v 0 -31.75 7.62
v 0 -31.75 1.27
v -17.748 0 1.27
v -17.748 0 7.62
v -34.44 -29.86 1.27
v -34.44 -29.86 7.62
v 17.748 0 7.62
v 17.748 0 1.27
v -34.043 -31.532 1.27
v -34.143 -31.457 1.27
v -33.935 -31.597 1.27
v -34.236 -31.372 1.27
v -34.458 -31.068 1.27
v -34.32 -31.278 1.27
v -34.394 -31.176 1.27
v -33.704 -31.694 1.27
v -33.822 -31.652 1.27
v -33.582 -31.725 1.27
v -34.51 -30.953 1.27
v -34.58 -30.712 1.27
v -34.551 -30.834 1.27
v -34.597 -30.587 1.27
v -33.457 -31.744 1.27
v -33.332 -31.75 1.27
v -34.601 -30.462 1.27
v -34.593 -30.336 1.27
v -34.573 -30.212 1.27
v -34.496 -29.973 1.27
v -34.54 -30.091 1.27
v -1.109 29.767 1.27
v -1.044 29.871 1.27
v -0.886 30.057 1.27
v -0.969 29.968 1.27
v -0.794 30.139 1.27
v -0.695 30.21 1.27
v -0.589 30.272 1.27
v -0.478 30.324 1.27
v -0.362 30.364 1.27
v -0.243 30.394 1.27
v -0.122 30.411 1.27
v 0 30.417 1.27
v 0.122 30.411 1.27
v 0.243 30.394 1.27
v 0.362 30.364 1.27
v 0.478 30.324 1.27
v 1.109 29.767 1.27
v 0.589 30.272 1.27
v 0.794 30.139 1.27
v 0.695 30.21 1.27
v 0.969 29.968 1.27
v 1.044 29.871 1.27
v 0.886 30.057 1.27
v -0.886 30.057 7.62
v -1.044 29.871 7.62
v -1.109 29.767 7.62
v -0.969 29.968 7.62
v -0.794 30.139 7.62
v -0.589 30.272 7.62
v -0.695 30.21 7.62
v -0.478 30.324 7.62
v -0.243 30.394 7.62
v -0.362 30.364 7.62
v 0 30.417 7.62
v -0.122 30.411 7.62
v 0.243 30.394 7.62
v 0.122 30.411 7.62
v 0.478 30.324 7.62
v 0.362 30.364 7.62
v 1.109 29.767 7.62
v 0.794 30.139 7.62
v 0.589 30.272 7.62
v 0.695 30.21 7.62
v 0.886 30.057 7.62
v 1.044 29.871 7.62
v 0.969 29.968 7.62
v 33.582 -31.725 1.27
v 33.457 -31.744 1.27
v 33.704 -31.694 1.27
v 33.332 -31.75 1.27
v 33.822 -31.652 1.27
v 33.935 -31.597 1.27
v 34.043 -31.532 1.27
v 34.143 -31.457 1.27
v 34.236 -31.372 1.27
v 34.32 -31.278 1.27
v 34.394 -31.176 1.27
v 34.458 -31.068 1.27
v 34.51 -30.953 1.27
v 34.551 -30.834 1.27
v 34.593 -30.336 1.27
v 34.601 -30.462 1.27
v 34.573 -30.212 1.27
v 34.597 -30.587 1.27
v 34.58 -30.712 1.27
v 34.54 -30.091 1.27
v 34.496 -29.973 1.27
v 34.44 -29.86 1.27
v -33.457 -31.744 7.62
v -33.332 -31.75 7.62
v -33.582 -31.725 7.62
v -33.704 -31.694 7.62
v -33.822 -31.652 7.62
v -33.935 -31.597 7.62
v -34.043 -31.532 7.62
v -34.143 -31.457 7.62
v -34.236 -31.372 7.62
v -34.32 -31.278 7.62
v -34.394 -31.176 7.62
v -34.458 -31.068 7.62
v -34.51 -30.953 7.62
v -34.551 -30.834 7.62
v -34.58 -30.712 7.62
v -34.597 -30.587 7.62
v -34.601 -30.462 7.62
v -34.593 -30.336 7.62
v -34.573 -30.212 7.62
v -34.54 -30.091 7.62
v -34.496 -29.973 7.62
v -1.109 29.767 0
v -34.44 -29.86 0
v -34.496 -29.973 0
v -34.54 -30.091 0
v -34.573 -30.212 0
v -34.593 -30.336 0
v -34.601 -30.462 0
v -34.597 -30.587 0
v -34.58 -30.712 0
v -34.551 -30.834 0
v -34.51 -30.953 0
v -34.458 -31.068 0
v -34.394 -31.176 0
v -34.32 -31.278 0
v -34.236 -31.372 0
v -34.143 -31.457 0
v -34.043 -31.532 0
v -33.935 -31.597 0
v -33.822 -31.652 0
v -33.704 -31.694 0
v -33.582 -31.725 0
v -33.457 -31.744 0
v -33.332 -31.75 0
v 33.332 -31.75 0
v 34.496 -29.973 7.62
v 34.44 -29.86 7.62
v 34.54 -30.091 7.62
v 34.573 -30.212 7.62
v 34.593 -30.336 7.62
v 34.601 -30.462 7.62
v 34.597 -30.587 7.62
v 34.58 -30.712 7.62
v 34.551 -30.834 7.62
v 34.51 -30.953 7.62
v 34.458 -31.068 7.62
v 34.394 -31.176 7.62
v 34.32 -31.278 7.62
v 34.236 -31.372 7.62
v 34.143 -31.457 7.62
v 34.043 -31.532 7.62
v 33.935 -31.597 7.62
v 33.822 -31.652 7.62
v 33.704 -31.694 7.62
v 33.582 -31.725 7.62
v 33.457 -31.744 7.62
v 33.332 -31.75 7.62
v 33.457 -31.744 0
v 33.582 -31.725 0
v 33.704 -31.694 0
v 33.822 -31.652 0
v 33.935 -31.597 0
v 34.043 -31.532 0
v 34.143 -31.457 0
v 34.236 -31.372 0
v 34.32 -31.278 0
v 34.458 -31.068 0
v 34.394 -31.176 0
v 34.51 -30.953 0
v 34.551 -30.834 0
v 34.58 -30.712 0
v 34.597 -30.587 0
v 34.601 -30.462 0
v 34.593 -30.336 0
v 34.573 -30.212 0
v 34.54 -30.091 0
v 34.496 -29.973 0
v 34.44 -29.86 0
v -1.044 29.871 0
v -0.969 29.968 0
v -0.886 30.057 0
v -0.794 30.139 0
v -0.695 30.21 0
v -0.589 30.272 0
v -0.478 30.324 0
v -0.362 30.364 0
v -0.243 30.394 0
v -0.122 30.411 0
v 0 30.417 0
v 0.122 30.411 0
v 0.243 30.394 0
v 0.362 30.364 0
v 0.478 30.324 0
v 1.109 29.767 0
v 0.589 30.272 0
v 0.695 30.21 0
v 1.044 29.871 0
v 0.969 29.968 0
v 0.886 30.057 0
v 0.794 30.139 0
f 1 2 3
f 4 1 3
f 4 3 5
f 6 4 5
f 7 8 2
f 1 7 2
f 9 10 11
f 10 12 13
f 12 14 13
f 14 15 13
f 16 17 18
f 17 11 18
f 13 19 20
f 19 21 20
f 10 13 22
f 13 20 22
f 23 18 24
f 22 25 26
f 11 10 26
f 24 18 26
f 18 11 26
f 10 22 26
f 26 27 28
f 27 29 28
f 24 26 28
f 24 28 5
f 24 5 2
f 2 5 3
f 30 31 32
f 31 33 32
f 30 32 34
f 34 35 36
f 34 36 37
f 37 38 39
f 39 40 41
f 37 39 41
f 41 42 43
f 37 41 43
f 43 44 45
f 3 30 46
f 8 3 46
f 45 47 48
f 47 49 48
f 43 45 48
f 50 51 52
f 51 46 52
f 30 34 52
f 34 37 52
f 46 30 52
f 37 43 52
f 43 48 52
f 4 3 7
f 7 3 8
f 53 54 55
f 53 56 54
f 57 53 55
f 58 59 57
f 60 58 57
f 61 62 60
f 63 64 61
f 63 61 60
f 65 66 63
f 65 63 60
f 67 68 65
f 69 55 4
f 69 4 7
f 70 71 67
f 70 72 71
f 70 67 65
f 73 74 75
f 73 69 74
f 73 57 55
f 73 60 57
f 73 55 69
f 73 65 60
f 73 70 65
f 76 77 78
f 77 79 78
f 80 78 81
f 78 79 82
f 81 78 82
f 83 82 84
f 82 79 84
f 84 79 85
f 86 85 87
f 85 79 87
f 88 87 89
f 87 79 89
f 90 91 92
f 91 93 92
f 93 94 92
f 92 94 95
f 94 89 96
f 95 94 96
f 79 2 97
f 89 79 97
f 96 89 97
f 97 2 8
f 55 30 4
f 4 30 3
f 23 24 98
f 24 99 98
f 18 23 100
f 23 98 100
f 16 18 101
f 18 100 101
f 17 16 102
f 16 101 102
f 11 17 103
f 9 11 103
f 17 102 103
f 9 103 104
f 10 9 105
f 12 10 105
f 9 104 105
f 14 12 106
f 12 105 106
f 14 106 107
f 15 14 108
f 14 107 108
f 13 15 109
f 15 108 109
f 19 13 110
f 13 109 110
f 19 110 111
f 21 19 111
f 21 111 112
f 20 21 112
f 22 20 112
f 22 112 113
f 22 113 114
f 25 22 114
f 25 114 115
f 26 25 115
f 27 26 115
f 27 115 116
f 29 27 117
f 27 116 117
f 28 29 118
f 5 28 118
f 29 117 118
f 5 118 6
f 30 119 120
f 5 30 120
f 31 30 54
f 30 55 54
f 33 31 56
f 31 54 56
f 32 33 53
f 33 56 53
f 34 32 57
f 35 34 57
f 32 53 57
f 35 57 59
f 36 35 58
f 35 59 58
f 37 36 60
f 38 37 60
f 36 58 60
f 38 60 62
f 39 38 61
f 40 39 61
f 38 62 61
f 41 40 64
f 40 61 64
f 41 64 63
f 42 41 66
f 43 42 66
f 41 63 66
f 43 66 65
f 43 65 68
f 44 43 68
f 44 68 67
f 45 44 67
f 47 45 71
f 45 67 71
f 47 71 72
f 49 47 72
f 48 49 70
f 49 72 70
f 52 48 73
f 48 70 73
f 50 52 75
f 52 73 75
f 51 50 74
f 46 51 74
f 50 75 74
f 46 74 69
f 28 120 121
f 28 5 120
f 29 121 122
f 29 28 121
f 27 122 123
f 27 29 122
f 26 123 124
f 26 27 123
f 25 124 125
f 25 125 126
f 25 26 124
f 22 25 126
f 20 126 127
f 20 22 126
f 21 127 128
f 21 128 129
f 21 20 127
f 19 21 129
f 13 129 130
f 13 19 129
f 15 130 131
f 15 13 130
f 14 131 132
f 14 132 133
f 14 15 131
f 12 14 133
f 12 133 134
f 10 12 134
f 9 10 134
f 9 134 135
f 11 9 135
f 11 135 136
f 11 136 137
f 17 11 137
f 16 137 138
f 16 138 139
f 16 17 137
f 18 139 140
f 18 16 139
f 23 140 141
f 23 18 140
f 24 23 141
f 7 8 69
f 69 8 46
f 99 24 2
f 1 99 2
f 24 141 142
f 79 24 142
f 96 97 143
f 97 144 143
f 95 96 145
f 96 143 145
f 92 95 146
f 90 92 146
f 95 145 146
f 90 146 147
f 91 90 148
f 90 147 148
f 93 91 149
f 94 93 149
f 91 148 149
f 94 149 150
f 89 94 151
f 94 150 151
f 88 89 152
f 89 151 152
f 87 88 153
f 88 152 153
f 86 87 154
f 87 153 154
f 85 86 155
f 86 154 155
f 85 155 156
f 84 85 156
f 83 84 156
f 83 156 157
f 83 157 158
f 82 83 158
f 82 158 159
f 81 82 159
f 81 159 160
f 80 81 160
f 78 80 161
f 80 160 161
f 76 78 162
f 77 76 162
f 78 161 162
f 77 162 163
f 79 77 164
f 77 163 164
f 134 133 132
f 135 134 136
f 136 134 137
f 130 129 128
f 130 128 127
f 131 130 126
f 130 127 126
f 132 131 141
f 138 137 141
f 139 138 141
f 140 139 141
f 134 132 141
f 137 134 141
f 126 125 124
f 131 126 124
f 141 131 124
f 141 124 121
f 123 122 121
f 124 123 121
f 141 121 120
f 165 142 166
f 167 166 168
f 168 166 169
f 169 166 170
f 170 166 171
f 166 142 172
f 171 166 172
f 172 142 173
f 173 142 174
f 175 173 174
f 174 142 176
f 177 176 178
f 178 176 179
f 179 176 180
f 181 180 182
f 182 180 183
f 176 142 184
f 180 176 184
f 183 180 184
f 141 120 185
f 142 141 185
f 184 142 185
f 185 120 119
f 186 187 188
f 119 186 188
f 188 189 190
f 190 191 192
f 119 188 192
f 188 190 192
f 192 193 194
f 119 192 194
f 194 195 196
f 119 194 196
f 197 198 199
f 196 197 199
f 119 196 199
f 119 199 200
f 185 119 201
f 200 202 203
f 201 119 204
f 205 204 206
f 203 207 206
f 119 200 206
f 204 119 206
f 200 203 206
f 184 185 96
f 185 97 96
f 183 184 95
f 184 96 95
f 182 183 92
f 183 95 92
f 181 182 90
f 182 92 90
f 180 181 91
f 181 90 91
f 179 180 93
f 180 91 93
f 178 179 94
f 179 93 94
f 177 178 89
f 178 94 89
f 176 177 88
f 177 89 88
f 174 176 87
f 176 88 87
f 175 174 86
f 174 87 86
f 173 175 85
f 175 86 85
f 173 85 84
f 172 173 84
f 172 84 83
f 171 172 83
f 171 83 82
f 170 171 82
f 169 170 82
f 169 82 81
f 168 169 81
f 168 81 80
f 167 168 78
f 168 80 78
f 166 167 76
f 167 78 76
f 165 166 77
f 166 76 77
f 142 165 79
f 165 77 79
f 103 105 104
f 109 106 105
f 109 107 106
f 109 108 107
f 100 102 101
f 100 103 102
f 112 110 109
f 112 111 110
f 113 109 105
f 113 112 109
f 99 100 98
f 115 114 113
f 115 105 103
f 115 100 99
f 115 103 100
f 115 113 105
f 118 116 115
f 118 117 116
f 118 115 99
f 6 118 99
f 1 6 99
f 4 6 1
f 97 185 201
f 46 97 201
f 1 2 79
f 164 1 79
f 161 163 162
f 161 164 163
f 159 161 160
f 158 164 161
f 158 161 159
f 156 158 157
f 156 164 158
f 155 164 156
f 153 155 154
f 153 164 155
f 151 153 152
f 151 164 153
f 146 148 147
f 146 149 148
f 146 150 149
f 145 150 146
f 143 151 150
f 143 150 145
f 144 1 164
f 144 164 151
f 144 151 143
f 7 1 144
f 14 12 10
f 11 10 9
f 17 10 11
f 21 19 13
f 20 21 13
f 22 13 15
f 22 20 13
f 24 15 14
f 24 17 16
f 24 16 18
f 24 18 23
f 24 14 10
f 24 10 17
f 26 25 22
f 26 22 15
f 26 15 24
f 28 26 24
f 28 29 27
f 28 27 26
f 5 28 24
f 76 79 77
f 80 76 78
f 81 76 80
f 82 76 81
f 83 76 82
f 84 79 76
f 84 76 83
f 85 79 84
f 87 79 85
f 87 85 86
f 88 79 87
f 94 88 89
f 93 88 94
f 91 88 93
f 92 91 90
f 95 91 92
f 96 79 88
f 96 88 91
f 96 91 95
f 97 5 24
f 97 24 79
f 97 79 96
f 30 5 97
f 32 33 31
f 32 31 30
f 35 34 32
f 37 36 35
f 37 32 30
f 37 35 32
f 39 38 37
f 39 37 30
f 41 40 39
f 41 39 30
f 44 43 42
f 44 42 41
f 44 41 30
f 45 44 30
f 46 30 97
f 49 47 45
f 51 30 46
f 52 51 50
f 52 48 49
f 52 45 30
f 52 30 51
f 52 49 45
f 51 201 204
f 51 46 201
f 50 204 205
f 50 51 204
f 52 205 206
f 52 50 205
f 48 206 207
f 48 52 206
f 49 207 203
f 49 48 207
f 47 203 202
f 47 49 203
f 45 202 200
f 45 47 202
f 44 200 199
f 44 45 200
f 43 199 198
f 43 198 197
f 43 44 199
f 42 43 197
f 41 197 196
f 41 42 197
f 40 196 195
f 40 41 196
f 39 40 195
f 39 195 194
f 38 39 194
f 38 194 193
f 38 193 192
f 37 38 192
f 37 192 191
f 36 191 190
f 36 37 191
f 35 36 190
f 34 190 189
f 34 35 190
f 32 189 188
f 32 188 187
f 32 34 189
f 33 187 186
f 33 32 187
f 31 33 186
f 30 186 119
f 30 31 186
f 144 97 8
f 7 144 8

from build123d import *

# Parameters (mm, degrees)
F1_DEPTH = 1.27
F3_DEPTH = 6.35
F4_R     = 1.27
F4_2_R   = 1.27


with BuildPart() as f1:
    # F0 (on Top) → F1 (new body)
    with BuildSketch(Plane.XY):
        Polygon((35.4965, -31.75), (0, 31.75), (-35.4965, -31.75), align=None)
    extrude(amount=F1_DEPTH)

    # F4#2
    f4_2_edges = [f1.edges().sort_by_distance(p)[0] for p in [
        (35.4965, -31.75, 0.635),
        (0, 31.75, 0.635),
        (-35.4965, -31.75, 0.635),
    ]]
    fillet(f4_2_edges, radius=F4_2_R)


with BuildPart() as f3:
    # F2 (on face) → F3 (new body)
    with BuildSketch(Plane.XY.offset(1.27)):
        Polygon((17.74825, 0), (0, -31.75), (35.4965, -31.75), align=None)
        Polygon((-35.4965, -31.75), (0, -31.75), (-17.74825, 0), align=None)
        Polygon((0, 31.75), (-17.74825, 0), (17.74825, 0), align=None)
    extrude(amount=F3_DEPTH)

    # F4
    f4_edges = [f3.edges().sort_by_distance(p)[0] for p in [
        (-35.4965, -31.75, 4.445),
        (35.4965, -31.75, 4.445),
        (0, 31.75, 4.445),
    ]]
    fillet(f4_edges, radius=F4_R)


solid = Compound([f1.part, f3.part])
